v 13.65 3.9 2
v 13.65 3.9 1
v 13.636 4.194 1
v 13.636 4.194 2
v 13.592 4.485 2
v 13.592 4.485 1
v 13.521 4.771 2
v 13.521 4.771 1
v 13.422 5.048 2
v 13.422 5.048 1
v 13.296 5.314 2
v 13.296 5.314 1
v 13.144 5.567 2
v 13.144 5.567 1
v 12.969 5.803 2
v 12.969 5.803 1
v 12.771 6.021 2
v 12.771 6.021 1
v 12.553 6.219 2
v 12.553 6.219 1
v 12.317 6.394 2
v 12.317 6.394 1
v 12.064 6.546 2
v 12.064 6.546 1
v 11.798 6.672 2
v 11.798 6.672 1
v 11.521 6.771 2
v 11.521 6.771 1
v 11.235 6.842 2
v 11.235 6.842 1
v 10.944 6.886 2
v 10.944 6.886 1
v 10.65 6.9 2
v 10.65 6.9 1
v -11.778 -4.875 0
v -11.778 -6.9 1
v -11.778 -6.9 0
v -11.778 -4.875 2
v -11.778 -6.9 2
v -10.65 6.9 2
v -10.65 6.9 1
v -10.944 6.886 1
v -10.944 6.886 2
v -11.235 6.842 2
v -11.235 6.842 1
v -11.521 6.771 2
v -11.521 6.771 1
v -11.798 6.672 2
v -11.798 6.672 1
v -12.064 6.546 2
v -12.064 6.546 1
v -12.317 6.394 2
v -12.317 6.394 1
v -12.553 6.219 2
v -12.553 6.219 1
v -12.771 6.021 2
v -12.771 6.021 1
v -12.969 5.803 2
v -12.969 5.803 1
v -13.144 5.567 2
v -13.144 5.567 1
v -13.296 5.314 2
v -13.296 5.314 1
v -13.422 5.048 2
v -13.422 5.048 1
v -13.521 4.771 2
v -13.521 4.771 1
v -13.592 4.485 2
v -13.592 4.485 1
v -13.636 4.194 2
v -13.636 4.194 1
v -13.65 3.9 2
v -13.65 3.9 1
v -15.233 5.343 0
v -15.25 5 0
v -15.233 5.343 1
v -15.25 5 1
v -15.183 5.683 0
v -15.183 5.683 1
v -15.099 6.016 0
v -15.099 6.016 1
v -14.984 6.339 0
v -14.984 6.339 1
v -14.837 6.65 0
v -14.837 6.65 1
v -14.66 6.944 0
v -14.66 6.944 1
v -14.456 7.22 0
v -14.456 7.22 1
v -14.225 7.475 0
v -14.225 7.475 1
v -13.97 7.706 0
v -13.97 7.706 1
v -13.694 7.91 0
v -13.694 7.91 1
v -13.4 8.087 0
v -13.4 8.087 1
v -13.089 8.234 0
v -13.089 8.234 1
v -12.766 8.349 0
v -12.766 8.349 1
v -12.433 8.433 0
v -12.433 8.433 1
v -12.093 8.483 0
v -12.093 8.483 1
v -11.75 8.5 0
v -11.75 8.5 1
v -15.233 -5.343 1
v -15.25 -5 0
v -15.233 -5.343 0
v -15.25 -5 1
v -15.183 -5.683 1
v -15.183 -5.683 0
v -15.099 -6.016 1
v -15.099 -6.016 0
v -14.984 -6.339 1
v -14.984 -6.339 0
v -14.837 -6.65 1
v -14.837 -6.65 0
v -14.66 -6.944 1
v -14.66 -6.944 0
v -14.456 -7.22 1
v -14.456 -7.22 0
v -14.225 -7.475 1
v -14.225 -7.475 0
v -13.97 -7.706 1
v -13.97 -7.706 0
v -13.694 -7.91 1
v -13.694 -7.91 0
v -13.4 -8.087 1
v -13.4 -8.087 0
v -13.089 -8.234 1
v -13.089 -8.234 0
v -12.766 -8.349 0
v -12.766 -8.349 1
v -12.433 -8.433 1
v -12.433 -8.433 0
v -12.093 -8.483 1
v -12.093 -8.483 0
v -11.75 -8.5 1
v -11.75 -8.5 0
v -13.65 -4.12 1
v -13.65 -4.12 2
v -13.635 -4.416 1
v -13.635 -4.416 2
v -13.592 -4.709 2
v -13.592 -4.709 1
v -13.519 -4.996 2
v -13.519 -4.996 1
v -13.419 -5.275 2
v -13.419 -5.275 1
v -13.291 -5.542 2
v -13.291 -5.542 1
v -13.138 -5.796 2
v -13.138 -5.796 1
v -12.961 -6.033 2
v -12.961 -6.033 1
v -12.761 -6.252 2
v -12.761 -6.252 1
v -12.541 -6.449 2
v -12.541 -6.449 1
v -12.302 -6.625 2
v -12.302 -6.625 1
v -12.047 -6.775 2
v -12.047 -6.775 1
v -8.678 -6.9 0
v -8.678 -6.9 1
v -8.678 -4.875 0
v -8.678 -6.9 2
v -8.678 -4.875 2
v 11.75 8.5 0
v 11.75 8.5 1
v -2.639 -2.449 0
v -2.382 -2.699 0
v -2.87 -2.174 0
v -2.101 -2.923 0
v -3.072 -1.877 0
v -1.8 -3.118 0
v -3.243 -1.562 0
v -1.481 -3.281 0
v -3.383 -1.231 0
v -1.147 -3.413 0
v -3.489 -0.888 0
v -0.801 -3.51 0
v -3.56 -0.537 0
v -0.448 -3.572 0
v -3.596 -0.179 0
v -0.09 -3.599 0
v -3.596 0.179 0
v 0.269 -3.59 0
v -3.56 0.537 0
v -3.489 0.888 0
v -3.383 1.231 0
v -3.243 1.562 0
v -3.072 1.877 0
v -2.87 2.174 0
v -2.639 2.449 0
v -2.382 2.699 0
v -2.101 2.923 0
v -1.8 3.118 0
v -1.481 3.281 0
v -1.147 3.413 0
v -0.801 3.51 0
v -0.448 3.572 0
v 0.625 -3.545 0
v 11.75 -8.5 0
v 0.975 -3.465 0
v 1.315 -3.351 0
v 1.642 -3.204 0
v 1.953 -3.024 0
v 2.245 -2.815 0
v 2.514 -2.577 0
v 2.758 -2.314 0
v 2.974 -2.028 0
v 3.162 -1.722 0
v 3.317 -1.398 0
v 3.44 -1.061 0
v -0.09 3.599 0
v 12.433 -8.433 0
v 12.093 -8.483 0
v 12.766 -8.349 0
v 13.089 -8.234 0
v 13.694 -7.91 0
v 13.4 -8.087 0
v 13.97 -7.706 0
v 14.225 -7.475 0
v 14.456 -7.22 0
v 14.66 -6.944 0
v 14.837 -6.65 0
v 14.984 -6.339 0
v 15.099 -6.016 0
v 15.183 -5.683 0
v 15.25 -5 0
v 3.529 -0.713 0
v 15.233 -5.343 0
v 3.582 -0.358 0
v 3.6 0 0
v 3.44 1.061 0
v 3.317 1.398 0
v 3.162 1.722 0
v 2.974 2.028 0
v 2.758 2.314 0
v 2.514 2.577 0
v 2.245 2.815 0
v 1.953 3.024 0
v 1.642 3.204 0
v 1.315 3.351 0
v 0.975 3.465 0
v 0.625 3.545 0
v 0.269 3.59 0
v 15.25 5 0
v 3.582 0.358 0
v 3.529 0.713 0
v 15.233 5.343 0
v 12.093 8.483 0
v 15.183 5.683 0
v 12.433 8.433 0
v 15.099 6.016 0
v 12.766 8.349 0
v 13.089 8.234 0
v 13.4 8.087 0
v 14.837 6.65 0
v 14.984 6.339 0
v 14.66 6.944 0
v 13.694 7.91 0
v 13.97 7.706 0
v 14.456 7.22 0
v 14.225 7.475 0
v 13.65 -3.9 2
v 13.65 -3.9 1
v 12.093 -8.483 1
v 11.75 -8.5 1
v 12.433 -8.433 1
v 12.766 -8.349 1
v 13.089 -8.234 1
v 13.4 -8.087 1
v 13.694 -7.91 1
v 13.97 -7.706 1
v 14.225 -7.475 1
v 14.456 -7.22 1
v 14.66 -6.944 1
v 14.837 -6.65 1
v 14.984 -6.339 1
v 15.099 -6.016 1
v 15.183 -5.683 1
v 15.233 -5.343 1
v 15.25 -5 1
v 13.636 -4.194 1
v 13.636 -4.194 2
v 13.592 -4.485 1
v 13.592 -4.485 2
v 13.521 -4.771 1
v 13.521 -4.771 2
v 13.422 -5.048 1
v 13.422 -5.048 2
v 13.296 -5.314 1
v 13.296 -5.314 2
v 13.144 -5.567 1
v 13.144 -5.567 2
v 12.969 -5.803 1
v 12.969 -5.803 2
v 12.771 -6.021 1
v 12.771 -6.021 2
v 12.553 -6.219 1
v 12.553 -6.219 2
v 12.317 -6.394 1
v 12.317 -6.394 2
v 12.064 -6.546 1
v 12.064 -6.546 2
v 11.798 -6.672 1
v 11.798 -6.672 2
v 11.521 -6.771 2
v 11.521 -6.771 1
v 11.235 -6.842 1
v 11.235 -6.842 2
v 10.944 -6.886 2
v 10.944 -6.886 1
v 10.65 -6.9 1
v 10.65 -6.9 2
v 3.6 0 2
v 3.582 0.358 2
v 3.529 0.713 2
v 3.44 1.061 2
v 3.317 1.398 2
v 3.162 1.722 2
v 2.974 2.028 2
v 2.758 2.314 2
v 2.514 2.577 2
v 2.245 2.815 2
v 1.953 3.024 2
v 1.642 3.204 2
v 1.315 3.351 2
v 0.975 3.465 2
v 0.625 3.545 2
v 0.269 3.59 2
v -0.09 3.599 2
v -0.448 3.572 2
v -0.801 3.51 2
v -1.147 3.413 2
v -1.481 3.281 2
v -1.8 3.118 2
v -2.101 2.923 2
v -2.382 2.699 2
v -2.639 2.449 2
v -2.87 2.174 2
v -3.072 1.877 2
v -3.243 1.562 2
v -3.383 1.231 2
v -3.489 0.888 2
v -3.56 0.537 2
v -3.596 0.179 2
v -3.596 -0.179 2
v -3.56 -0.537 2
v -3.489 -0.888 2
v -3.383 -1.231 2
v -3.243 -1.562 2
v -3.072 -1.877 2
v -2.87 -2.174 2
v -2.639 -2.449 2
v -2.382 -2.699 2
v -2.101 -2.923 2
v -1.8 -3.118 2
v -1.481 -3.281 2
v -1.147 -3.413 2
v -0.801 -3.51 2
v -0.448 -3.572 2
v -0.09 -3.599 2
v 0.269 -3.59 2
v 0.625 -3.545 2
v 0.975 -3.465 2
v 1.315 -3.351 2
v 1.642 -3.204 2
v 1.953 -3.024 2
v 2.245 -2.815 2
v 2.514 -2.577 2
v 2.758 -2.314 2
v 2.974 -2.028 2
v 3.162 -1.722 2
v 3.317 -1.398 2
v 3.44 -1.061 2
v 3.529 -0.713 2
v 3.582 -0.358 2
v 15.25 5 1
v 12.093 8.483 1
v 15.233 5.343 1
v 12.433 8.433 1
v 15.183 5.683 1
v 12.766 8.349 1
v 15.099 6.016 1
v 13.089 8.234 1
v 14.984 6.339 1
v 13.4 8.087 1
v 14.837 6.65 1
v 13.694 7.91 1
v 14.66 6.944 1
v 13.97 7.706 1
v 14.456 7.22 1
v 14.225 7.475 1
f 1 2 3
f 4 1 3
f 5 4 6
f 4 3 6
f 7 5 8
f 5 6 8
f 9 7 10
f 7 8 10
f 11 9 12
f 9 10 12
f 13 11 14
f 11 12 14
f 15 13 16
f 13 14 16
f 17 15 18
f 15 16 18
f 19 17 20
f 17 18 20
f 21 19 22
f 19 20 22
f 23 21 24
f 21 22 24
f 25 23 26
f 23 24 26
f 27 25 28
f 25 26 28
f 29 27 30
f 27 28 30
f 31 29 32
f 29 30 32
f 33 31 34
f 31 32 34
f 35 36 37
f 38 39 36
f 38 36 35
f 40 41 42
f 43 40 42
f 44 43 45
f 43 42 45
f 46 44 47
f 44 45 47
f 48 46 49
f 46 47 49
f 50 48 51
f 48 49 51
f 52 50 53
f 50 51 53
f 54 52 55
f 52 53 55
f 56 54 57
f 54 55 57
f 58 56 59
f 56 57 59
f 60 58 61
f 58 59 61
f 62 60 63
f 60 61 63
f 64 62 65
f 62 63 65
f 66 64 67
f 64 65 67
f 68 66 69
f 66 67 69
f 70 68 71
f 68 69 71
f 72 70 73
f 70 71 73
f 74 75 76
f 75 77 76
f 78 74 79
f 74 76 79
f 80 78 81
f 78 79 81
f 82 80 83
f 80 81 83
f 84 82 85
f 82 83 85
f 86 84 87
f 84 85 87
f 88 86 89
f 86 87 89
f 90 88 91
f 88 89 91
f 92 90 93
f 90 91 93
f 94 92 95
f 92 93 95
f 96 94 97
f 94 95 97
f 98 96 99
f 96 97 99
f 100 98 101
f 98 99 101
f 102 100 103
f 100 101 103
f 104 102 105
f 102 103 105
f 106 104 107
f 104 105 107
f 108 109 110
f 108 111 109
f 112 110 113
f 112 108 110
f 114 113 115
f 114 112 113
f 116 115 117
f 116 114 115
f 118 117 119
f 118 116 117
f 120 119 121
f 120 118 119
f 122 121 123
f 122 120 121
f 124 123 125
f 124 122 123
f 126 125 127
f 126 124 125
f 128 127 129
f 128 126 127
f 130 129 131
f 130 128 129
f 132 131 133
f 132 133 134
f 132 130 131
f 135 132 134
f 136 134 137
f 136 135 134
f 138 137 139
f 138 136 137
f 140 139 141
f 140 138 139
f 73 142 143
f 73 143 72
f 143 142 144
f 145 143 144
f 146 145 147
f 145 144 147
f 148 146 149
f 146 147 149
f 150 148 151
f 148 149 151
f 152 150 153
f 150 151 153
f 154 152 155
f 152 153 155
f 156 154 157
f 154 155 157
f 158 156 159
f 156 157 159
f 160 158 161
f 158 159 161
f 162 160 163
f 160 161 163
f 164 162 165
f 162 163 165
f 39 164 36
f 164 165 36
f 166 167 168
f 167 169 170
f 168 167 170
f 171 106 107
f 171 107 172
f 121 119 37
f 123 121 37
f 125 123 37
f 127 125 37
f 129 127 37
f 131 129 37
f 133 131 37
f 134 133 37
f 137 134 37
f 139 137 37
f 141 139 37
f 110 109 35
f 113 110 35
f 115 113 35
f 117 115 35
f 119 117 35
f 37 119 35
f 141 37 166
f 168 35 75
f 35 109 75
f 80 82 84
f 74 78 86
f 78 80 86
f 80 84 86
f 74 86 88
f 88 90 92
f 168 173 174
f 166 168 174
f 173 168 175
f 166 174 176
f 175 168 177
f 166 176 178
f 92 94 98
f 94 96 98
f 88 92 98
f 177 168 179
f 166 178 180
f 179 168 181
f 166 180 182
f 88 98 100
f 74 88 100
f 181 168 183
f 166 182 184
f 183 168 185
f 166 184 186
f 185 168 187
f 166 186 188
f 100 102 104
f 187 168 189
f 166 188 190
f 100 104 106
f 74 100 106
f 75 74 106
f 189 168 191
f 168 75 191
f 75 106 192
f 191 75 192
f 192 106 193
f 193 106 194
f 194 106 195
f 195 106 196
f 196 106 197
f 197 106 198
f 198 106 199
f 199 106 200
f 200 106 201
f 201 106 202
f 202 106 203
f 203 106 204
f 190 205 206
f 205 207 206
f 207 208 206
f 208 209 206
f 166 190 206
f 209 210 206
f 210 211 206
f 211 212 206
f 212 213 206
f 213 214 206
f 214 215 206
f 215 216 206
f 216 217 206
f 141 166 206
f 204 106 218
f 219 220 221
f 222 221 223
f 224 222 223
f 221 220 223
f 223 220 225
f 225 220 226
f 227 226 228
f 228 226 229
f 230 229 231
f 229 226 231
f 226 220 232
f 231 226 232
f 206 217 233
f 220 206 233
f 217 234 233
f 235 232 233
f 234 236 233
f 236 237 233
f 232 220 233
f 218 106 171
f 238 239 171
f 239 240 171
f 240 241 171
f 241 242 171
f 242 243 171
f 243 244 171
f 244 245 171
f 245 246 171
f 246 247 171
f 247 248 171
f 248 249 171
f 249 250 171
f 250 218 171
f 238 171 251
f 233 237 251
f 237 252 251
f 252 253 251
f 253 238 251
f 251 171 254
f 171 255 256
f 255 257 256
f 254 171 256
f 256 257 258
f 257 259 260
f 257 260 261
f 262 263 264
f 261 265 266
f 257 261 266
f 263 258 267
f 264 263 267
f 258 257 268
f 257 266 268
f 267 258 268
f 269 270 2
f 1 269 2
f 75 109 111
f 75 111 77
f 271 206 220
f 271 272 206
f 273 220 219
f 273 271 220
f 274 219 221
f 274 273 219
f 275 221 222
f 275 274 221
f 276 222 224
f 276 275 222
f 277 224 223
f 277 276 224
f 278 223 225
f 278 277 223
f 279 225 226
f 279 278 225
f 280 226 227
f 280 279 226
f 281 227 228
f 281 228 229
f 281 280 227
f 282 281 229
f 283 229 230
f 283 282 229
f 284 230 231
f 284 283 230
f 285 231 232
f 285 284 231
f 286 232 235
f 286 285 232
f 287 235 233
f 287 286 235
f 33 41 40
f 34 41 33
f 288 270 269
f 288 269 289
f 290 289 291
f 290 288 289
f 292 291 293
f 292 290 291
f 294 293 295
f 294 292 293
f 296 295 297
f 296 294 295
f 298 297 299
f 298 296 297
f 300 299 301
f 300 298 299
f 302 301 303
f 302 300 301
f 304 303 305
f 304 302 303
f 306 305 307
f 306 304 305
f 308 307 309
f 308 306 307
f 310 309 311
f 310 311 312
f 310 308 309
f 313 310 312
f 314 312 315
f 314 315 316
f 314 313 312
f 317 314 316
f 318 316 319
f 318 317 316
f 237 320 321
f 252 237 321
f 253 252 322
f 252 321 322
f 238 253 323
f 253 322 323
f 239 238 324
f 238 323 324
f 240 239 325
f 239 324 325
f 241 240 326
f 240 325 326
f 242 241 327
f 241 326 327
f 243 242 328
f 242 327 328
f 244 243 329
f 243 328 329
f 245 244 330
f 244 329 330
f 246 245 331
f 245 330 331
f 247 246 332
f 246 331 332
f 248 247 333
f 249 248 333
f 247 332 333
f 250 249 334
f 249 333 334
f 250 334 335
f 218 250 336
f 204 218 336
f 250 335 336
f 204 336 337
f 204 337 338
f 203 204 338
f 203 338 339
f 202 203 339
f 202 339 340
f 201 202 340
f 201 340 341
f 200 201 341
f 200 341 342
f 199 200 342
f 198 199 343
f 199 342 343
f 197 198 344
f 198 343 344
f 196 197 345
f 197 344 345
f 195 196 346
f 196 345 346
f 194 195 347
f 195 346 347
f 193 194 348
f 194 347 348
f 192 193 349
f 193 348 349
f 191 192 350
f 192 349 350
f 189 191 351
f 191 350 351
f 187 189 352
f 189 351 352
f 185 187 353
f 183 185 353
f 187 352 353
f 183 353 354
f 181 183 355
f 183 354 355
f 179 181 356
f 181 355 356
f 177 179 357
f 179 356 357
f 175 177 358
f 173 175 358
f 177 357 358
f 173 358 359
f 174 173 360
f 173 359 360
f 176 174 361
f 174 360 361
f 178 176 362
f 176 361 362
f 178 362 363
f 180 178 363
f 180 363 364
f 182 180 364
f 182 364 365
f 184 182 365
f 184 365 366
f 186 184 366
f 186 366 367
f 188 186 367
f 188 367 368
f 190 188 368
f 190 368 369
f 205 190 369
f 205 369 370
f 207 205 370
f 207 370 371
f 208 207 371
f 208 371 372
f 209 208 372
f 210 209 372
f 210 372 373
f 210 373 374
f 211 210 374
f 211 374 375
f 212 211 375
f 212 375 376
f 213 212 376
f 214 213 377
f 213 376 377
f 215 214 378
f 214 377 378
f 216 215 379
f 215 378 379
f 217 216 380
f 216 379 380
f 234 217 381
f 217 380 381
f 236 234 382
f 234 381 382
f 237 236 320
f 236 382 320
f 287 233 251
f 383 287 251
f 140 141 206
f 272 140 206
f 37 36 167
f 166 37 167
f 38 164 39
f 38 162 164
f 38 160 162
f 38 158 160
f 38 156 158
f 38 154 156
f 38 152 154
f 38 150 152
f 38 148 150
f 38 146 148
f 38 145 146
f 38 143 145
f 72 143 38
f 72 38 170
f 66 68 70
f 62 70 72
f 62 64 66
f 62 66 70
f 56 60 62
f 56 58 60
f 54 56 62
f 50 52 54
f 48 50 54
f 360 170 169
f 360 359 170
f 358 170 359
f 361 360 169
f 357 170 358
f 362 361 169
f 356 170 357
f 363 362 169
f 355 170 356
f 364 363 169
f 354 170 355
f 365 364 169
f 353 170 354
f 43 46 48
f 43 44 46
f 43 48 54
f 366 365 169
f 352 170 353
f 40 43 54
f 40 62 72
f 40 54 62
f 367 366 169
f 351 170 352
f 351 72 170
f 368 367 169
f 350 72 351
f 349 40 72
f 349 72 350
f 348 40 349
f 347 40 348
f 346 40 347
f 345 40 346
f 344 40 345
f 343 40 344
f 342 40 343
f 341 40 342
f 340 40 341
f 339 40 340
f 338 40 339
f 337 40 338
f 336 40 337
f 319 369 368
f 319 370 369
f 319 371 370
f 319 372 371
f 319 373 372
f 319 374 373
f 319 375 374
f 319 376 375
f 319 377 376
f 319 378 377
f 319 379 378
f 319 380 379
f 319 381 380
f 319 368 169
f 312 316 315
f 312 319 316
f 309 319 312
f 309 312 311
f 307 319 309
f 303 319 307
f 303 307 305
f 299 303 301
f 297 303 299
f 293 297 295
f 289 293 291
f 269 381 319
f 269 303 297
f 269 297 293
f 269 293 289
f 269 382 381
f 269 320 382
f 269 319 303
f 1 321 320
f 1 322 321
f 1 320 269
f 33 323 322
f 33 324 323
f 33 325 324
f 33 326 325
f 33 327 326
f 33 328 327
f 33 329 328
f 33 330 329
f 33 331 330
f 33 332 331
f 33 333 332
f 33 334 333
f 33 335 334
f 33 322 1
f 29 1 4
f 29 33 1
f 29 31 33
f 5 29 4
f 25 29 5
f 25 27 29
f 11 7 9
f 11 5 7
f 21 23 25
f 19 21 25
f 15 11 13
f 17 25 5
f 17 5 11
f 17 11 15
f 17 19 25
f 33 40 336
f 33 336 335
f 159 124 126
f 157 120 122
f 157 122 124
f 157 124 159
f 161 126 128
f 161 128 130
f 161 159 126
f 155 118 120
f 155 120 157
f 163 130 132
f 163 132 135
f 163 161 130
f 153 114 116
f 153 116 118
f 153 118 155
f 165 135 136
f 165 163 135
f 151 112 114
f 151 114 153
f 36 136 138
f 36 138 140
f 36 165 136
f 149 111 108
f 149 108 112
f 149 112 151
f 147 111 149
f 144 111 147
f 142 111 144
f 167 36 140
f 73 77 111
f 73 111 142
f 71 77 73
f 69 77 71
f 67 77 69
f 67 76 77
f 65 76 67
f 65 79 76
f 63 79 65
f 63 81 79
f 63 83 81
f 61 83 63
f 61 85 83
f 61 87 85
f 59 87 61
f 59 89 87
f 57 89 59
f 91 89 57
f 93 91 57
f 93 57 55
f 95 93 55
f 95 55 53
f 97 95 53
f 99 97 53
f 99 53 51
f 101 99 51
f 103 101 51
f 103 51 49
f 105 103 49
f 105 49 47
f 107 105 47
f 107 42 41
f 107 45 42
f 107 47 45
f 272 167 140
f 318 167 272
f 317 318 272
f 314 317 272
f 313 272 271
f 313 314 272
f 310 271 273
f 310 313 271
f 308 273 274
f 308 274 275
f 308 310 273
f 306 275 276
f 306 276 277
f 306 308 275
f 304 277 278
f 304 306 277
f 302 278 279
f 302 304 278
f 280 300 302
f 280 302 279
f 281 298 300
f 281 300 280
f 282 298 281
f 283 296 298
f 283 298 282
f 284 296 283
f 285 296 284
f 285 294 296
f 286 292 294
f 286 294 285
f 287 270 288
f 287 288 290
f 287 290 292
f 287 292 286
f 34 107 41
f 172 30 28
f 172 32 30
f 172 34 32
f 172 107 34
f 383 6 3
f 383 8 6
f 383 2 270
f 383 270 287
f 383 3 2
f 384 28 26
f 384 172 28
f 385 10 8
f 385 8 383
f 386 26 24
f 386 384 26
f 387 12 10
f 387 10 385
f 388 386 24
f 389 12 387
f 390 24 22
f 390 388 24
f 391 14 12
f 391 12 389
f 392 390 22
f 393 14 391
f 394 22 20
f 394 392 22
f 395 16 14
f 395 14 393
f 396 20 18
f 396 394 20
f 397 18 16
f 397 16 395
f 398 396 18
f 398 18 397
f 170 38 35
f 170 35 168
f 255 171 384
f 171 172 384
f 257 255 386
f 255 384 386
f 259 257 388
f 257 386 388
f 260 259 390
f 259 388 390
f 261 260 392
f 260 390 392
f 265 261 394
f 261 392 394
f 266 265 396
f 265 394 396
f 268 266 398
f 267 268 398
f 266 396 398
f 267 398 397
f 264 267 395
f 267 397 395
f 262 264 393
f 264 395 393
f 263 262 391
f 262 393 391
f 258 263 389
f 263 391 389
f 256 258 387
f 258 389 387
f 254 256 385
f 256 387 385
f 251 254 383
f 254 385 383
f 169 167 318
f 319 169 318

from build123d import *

# Parameters (mm, degrees)
F0_W        = 30.5
F0_H        = 17
F1_DEPTH    = 1
F2_W        = 27.3
F2_H        = 13.8
F3_DEPTH    = 1
F4_R        = 3.6
F4_W        = 3.1
F4_H        = 2.025
F5_DEPTH    = 2
F6_T1_DEPTH = 7.9496474731
F6_T3_DEPTH = 8.5
F7_R        = 3.5


# Not quite as in the source:
# - a fillet or chamfer that OpenCascade refuses, or shapes differently, is made with other operations: its cross-section is extruded or revolved along the edge and cut away or added


with BuildPart() as f1:
    # F0 (on Top) → F1 (new body)
    with BuildSketch(Plane.XY):
        Rectangle(F0_W, F0_H)
    extrude(amount=F1_DEPTH)

    # F2 (on face) → F3 (join)
    with BuildSketch(Plane.XY.offset(1)):
        Rectangle(F2_W, F2_H)
    extrude(amount=F3_DEPTH)

    # F4 (on face) → F5 (cut)
    with BuildSketch(Plane.XY.offset(2)):
        Circle(F4_R)
        with Locations((-10.228, -5.8875)):
            Rectangle(F4_W, F4_H)
    extrude(amount=-F5_DEPTH, mode=Mode.SUBTRACT)

    # F6: fillet of radius 3 on 4 edges, made by hand

    # F6_s2 → F6_t1 (cut)
    with BuildSketch(Plane.XY.offset(1)):
        with BuildLine():
            ThreePointArc((-13.65, -4.1201410108), (-13.1383729624, -5.795849816), (-11.778, -6.9))
            Line((-11.778, -6.9), (-13.65, -6.9))
            Line((-13.65, -6.9), (-13.65, -4.1201410108))
        make_face()
    extrude(amount=F6_T1_DEPTH, mode=Mode.SUBTRACT)

    # F6_s4 → F6_t3 (cut)
    with BuildSketch(Plane.XY.offset(1)):
        with BuildLine():
            ThreePointArc((13.65, -3.9), (12.7713203436, -6.0213203436), (10.65, -6.9))
            Line((10.65, -6.9), (13.65, -6.9))
            Line((13.65, -6.9), (13.65, -3.9))
        make_face()
        with BuildLine():
            ThreePointArc((-10.65, 6.9), (-12.7713203436, 6.0213203436), (-13.65, 3.9))
            Line((-13.65, 3.9), (-13.65, 6.9))
            Line((-13.65, 6.9), (-10.65, 6.9))
        make_face()
        with BuildLine():
            ThreePointArc((13.65, 3.9), (12.7713203436, 6.0213203436), (10.65, 6.9))
            Line((10.65, 6.9), (13.65, 6.9))
            Line((13.65, 6.9), (13.65, 3.9))
        make_face()
    extrude(amount=F6_T3_DEPTH, mode=Mode.SUBTRACT)

    # F7
    f7_edges = [f1.edges().sort_by_distance(p)[0] for p in [
        (15.25, 8.5, 0.5),
        (-15.25, 8.5, 0.5),
        (-15.25, -8.5, 0.5),
        (15.25, -8.5, 0.5),
    ]]
    fillet(f7_edges, radius=F7_R)


solid = f1.part
